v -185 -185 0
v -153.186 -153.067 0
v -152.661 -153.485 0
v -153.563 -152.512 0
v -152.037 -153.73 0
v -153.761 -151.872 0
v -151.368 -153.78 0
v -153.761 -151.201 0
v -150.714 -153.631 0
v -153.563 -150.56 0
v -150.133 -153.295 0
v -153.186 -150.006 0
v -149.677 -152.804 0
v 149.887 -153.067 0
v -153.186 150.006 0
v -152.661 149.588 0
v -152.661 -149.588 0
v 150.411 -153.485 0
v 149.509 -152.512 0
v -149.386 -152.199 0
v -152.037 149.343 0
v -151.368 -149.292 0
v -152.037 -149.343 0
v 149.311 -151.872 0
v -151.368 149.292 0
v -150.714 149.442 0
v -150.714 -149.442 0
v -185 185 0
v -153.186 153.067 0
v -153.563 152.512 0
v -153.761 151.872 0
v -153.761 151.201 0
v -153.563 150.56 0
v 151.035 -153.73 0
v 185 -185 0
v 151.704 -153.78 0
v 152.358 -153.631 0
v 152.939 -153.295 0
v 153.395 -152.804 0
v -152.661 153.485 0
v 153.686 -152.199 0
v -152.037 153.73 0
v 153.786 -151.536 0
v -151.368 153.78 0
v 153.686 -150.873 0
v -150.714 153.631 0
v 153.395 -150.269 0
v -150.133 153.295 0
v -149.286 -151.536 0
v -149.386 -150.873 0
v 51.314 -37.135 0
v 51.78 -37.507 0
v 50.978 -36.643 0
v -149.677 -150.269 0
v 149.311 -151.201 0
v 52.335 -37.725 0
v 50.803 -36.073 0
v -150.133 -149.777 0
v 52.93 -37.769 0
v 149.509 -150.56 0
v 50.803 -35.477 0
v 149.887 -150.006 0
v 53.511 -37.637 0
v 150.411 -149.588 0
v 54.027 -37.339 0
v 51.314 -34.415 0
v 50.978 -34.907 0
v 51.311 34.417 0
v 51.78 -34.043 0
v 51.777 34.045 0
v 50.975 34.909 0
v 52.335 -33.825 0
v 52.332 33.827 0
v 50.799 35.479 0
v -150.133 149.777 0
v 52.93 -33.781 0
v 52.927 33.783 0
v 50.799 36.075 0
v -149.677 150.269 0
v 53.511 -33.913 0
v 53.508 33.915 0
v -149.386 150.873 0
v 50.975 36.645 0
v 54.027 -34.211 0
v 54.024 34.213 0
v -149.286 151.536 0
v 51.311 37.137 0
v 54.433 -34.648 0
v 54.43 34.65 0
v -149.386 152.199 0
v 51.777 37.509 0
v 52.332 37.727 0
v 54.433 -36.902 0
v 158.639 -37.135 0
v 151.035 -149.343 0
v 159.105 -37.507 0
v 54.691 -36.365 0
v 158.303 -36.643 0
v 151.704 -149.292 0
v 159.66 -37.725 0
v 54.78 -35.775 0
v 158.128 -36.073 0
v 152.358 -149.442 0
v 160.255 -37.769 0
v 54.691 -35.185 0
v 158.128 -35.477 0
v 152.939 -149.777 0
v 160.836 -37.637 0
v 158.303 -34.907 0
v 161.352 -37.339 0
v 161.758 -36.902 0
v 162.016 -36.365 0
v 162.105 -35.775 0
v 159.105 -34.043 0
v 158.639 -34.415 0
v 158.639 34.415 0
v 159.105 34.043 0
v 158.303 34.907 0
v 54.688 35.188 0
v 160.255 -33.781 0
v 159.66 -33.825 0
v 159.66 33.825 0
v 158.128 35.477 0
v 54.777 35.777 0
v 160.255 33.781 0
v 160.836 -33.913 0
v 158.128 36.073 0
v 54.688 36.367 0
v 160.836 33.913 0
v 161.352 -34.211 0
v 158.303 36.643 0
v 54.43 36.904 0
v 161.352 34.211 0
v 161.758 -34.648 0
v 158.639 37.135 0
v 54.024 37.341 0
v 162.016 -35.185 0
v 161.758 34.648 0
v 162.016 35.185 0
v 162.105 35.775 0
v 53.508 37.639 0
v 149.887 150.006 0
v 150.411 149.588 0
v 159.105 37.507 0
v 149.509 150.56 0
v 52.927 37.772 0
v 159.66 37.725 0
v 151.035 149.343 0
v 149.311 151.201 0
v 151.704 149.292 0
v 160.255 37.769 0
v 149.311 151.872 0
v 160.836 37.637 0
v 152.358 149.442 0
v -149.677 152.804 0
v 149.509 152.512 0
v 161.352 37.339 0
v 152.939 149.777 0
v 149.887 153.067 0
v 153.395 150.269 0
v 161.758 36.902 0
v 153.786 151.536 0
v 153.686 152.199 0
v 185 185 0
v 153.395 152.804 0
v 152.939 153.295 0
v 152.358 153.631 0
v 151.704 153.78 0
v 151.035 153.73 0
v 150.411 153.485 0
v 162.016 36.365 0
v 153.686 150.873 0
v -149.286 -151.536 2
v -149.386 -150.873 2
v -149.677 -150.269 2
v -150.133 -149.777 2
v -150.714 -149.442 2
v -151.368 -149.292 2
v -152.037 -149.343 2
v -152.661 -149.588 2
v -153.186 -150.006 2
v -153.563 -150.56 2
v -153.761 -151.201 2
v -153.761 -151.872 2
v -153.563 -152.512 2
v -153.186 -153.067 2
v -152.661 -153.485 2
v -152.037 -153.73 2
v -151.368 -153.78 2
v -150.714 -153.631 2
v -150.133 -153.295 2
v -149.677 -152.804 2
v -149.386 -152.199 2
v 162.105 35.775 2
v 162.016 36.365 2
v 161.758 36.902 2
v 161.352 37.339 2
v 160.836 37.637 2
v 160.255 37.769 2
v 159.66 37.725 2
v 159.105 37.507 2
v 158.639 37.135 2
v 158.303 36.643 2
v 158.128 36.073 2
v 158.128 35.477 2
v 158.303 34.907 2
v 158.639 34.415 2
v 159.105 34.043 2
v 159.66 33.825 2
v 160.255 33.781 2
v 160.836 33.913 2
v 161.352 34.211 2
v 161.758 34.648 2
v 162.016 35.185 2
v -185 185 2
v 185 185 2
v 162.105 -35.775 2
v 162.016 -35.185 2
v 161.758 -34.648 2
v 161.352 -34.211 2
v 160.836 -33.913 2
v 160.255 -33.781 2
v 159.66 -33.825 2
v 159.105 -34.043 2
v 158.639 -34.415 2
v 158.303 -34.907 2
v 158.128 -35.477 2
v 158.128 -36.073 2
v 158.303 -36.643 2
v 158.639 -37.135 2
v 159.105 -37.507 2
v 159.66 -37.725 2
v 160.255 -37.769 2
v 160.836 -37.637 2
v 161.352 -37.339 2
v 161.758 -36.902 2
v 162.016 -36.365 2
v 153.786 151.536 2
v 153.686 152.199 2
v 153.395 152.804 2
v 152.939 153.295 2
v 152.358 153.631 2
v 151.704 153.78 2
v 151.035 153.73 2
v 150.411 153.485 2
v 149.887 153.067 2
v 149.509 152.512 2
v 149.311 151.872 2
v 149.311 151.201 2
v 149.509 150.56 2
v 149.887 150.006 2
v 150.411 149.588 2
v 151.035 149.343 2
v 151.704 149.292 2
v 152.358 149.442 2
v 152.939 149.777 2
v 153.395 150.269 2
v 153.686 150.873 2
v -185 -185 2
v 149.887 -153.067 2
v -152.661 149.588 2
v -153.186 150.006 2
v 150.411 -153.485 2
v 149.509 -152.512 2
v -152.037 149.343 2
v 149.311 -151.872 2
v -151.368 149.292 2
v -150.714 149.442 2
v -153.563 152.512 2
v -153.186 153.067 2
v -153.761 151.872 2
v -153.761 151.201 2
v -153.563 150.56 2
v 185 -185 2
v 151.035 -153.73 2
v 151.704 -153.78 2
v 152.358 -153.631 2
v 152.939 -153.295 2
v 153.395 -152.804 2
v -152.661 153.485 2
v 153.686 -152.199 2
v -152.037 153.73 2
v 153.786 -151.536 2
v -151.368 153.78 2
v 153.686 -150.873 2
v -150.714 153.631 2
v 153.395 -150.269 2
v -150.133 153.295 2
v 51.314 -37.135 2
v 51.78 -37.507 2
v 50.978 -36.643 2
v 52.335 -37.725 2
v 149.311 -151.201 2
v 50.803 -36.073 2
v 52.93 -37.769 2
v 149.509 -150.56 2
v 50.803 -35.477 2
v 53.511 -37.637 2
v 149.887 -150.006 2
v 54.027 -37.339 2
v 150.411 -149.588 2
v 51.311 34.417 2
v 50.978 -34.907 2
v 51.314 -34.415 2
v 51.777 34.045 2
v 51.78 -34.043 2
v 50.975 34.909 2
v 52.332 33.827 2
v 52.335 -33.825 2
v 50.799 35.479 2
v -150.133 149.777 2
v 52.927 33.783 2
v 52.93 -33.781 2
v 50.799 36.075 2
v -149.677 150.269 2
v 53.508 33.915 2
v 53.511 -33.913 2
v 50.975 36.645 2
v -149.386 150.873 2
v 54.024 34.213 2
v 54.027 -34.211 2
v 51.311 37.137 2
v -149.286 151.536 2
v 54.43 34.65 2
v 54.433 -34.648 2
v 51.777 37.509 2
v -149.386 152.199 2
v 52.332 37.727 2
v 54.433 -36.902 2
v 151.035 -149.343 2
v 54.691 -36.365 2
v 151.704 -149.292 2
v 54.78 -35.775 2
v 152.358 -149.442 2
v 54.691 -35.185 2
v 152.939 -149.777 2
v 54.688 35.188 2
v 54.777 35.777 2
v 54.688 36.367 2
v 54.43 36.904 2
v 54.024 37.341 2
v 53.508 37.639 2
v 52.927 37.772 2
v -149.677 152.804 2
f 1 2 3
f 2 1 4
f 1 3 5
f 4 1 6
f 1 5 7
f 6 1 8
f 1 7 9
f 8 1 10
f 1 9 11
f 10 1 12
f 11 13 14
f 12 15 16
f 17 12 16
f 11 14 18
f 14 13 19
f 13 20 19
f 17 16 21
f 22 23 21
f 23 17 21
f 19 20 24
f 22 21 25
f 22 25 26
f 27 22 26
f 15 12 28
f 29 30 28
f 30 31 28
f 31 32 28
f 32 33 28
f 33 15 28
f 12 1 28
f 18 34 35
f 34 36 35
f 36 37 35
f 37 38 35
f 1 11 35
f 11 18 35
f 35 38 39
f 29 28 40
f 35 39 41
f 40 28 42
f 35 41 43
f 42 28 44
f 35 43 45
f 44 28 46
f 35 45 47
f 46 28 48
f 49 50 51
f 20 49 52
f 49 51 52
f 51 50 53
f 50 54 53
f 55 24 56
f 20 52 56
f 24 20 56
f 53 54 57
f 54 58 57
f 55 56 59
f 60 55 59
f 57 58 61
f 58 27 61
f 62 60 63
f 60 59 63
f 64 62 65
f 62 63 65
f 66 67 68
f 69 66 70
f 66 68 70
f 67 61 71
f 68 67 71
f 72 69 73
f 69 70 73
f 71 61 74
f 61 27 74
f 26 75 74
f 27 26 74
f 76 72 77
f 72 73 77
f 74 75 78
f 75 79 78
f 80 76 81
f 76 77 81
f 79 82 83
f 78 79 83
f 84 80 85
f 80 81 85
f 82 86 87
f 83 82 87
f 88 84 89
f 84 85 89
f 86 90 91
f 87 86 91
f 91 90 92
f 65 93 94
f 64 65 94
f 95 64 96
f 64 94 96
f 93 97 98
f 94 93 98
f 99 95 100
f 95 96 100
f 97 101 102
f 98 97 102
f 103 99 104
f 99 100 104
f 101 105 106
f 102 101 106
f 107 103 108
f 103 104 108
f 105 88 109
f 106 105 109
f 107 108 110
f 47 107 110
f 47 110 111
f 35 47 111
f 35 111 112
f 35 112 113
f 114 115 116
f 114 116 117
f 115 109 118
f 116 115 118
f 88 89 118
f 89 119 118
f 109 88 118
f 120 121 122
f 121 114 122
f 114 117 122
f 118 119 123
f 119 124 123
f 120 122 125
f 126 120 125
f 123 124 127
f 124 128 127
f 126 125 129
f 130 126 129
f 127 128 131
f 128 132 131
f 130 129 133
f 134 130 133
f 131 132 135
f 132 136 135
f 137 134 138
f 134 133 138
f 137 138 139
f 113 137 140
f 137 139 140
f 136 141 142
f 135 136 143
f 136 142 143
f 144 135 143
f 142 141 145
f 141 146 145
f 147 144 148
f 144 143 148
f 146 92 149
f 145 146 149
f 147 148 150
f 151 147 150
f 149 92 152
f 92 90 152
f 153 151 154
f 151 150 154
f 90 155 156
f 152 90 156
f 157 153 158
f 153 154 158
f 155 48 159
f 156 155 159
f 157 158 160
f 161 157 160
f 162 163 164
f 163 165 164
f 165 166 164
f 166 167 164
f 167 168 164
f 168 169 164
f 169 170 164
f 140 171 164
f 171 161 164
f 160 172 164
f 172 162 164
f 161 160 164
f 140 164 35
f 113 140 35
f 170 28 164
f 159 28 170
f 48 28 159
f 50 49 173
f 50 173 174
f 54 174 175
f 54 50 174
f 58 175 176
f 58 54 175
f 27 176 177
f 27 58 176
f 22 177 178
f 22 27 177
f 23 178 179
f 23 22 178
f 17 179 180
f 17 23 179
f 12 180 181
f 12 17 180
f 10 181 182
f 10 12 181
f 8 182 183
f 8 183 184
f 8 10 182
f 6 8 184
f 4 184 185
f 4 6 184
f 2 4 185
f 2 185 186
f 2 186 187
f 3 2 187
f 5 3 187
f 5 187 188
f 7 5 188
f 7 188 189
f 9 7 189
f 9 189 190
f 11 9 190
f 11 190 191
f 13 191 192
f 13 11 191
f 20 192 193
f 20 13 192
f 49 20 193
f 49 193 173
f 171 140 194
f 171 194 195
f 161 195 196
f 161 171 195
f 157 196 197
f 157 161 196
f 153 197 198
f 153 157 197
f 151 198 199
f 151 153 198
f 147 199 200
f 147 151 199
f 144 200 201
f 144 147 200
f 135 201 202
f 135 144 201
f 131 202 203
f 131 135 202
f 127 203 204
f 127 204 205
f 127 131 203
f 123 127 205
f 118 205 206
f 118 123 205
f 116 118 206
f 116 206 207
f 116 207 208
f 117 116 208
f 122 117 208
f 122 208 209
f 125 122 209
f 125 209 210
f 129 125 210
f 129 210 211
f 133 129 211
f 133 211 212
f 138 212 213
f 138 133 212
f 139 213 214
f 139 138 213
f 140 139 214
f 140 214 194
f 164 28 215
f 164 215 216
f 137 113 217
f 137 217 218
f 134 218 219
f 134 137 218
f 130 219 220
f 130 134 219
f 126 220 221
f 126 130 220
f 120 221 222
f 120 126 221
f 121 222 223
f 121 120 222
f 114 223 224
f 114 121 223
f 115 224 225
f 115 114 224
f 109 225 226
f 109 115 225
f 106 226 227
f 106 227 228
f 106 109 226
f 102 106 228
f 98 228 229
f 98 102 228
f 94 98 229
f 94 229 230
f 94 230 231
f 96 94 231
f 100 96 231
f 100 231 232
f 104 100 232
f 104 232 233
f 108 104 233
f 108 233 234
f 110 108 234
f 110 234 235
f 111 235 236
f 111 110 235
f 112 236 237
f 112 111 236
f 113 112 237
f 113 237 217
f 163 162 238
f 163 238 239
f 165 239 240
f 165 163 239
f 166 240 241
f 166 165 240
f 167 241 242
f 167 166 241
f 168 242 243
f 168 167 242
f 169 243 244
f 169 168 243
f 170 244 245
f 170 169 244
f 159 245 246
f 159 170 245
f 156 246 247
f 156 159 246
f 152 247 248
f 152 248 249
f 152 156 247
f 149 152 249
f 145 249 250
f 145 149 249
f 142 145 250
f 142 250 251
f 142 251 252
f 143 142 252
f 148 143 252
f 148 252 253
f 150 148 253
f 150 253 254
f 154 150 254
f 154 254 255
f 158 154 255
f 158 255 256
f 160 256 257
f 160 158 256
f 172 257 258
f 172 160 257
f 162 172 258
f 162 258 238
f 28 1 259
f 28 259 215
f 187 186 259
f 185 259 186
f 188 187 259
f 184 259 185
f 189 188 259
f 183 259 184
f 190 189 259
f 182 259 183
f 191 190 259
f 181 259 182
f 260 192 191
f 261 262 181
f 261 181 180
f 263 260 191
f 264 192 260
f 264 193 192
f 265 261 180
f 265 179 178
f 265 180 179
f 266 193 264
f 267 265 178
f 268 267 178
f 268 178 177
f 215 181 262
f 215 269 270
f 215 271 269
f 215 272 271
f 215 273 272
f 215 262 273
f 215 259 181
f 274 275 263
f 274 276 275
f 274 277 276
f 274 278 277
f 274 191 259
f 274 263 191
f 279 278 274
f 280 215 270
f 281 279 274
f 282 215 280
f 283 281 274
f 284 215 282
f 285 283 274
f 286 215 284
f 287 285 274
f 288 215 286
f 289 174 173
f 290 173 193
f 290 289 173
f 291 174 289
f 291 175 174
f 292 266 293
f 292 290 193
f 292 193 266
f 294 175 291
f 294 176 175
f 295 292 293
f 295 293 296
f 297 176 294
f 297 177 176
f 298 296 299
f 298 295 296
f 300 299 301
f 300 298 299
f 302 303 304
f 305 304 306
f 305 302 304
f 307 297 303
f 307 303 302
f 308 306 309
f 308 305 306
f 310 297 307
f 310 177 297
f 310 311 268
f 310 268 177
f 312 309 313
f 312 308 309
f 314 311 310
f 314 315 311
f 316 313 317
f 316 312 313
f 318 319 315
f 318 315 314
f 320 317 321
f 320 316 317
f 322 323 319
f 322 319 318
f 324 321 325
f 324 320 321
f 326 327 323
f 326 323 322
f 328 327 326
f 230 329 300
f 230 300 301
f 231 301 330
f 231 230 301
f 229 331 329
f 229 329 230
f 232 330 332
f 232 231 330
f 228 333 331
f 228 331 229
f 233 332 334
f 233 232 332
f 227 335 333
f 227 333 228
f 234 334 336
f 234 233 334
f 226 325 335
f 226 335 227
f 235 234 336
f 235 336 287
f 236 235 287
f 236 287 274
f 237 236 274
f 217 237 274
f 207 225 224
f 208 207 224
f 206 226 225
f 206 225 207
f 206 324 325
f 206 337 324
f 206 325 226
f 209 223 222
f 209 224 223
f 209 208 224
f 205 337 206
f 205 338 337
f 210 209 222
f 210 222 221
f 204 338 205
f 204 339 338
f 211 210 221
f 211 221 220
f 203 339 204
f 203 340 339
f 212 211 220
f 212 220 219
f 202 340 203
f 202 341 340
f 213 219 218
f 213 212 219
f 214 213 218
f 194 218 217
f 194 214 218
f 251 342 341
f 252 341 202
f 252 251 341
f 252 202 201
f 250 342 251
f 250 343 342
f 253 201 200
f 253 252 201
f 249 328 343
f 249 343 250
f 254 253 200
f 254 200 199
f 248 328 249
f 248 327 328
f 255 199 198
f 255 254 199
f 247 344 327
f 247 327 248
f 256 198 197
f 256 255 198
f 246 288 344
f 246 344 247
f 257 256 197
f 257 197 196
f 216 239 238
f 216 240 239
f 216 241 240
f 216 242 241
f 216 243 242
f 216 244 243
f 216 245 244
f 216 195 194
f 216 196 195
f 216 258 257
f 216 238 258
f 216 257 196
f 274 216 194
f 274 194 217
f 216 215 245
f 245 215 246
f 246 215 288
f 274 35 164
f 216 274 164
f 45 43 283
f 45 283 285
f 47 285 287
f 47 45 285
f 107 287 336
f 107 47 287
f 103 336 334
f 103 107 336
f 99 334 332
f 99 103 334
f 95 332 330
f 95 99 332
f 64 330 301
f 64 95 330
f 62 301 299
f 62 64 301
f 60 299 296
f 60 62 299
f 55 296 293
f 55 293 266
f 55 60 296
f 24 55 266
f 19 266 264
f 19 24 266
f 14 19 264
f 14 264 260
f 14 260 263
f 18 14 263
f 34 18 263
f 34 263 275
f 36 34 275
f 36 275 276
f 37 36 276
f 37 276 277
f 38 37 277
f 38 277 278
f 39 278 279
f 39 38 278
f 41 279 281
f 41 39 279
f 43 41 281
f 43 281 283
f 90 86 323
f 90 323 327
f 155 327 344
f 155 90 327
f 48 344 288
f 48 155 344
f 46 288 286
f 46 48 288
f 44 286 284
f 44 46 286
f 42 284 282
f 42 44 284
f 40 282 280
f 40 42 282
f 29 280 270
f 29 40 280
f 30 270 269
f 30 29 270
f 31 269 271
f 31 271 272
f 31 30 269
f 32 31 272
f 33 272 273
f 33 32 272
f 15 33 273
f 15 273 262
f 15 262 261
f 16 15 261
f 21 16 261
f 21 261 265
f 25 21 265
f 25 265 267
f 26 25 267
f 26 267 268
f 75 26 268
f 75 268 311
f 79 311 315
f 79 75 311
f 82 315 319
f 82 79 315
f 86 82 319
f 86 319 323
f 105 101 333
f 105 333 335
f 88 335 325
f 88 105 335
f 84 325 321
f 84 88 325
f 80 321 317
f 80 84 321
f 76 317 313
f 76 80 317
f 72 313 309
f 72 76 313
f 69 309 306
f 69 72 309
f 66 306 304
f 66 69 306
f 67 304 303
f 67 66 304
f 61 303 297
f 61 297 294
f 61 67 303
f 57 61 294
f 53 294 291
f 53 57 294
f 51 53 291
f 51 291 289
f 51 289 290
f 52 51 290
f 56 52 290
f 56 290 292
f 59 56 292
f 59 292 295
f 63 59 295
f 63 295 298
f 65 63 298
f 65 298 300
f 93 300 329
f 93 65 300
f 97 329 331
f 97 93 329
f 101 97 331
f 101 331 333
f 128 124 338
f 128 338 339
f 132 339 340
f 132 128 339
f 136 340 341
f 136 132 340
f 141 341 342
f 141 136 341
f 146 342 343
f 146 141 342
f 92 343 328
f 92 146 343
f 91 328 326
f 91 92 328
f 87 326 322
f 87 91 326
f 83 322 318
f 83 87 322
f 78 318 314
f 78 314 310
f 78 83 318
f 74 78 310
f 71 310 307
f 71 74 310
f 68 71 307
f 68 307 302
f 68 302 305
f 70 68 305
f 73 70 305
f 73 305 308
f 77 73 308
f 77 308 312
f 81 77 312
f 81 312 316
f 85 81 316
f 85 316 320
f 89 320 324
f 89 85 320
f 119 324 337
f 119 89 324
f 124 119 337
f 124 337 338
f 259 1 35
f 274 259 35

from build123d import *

# Parameters (mm, degrees)
SKETCH1_W           = 370
SKETCH1_H           = 370
SKETCH1_R           = 2.25
SKETCH1_W_2         = 120
SKETCH1_H_2         = 80
SKETCH1_R_2         = 2
BOSS_EXTRUDE2_DEPTH = 2


with BuildPart() as part:
    # Sketch1 → Boss-Extrude2 (new body)
    # profile 1 of 2: a face of its own
    with BuildSketch(Plane.XY):
        Rectangle(SKETCH1_W, SKETCH1_H)
        with Locations((-151.53617158, -151.53617158)):
            Circle(SKETCH1_R, mode=Mode.SUBTRACT)
        with Locations((151.53617158, -151.53617158)):
            Circle(SKETCH1_R, mode=Mode.SUBTRACT)
        with Locations((151.53617158, 151.53617158)):
            Circle(SKETCH1_R, mode=Mode.SUBTRACT)
        with Locations((-151.53617158, 151.53617158)):
            Circle(SKETCH1_R, mode=Mode.SUBTRACT)
        with Locations((106.442762352, 0)):
            Rectangle(SKETCH1_W_2, SKETCH1_H_2, mode=Mode.SUBTRACT)
    # profile 2 of 2: a face of its own
    with BuildSketch(Plane.XY):
        with Locations((106.442762352, 0)):
            Rectangle(SKETCH1_W_2, SKETCH1_H_2)
        with Locations((160.105262352, -35.775)):
            Circle(SKETCH1_R_2, mode=Mode.SUBTRACT)
        with Locations((160.105262352, 35.775)):
            Circle(SKETCH1_R_2, mode=Mode.SUBTRACT)
        with Locations((52.780262352, -35.775)):
            Circle(SKETCH1_R_2, mode=Mode.SUBTRACT)
        with Locations((52.777109457, 35.777101931)):
            Circle(SKETCH1_R_2, mode=Mode.SUBTRACT)
    extrude(amount=BOSS_EXTRUDE2_DEPTH)


solid = part.part
